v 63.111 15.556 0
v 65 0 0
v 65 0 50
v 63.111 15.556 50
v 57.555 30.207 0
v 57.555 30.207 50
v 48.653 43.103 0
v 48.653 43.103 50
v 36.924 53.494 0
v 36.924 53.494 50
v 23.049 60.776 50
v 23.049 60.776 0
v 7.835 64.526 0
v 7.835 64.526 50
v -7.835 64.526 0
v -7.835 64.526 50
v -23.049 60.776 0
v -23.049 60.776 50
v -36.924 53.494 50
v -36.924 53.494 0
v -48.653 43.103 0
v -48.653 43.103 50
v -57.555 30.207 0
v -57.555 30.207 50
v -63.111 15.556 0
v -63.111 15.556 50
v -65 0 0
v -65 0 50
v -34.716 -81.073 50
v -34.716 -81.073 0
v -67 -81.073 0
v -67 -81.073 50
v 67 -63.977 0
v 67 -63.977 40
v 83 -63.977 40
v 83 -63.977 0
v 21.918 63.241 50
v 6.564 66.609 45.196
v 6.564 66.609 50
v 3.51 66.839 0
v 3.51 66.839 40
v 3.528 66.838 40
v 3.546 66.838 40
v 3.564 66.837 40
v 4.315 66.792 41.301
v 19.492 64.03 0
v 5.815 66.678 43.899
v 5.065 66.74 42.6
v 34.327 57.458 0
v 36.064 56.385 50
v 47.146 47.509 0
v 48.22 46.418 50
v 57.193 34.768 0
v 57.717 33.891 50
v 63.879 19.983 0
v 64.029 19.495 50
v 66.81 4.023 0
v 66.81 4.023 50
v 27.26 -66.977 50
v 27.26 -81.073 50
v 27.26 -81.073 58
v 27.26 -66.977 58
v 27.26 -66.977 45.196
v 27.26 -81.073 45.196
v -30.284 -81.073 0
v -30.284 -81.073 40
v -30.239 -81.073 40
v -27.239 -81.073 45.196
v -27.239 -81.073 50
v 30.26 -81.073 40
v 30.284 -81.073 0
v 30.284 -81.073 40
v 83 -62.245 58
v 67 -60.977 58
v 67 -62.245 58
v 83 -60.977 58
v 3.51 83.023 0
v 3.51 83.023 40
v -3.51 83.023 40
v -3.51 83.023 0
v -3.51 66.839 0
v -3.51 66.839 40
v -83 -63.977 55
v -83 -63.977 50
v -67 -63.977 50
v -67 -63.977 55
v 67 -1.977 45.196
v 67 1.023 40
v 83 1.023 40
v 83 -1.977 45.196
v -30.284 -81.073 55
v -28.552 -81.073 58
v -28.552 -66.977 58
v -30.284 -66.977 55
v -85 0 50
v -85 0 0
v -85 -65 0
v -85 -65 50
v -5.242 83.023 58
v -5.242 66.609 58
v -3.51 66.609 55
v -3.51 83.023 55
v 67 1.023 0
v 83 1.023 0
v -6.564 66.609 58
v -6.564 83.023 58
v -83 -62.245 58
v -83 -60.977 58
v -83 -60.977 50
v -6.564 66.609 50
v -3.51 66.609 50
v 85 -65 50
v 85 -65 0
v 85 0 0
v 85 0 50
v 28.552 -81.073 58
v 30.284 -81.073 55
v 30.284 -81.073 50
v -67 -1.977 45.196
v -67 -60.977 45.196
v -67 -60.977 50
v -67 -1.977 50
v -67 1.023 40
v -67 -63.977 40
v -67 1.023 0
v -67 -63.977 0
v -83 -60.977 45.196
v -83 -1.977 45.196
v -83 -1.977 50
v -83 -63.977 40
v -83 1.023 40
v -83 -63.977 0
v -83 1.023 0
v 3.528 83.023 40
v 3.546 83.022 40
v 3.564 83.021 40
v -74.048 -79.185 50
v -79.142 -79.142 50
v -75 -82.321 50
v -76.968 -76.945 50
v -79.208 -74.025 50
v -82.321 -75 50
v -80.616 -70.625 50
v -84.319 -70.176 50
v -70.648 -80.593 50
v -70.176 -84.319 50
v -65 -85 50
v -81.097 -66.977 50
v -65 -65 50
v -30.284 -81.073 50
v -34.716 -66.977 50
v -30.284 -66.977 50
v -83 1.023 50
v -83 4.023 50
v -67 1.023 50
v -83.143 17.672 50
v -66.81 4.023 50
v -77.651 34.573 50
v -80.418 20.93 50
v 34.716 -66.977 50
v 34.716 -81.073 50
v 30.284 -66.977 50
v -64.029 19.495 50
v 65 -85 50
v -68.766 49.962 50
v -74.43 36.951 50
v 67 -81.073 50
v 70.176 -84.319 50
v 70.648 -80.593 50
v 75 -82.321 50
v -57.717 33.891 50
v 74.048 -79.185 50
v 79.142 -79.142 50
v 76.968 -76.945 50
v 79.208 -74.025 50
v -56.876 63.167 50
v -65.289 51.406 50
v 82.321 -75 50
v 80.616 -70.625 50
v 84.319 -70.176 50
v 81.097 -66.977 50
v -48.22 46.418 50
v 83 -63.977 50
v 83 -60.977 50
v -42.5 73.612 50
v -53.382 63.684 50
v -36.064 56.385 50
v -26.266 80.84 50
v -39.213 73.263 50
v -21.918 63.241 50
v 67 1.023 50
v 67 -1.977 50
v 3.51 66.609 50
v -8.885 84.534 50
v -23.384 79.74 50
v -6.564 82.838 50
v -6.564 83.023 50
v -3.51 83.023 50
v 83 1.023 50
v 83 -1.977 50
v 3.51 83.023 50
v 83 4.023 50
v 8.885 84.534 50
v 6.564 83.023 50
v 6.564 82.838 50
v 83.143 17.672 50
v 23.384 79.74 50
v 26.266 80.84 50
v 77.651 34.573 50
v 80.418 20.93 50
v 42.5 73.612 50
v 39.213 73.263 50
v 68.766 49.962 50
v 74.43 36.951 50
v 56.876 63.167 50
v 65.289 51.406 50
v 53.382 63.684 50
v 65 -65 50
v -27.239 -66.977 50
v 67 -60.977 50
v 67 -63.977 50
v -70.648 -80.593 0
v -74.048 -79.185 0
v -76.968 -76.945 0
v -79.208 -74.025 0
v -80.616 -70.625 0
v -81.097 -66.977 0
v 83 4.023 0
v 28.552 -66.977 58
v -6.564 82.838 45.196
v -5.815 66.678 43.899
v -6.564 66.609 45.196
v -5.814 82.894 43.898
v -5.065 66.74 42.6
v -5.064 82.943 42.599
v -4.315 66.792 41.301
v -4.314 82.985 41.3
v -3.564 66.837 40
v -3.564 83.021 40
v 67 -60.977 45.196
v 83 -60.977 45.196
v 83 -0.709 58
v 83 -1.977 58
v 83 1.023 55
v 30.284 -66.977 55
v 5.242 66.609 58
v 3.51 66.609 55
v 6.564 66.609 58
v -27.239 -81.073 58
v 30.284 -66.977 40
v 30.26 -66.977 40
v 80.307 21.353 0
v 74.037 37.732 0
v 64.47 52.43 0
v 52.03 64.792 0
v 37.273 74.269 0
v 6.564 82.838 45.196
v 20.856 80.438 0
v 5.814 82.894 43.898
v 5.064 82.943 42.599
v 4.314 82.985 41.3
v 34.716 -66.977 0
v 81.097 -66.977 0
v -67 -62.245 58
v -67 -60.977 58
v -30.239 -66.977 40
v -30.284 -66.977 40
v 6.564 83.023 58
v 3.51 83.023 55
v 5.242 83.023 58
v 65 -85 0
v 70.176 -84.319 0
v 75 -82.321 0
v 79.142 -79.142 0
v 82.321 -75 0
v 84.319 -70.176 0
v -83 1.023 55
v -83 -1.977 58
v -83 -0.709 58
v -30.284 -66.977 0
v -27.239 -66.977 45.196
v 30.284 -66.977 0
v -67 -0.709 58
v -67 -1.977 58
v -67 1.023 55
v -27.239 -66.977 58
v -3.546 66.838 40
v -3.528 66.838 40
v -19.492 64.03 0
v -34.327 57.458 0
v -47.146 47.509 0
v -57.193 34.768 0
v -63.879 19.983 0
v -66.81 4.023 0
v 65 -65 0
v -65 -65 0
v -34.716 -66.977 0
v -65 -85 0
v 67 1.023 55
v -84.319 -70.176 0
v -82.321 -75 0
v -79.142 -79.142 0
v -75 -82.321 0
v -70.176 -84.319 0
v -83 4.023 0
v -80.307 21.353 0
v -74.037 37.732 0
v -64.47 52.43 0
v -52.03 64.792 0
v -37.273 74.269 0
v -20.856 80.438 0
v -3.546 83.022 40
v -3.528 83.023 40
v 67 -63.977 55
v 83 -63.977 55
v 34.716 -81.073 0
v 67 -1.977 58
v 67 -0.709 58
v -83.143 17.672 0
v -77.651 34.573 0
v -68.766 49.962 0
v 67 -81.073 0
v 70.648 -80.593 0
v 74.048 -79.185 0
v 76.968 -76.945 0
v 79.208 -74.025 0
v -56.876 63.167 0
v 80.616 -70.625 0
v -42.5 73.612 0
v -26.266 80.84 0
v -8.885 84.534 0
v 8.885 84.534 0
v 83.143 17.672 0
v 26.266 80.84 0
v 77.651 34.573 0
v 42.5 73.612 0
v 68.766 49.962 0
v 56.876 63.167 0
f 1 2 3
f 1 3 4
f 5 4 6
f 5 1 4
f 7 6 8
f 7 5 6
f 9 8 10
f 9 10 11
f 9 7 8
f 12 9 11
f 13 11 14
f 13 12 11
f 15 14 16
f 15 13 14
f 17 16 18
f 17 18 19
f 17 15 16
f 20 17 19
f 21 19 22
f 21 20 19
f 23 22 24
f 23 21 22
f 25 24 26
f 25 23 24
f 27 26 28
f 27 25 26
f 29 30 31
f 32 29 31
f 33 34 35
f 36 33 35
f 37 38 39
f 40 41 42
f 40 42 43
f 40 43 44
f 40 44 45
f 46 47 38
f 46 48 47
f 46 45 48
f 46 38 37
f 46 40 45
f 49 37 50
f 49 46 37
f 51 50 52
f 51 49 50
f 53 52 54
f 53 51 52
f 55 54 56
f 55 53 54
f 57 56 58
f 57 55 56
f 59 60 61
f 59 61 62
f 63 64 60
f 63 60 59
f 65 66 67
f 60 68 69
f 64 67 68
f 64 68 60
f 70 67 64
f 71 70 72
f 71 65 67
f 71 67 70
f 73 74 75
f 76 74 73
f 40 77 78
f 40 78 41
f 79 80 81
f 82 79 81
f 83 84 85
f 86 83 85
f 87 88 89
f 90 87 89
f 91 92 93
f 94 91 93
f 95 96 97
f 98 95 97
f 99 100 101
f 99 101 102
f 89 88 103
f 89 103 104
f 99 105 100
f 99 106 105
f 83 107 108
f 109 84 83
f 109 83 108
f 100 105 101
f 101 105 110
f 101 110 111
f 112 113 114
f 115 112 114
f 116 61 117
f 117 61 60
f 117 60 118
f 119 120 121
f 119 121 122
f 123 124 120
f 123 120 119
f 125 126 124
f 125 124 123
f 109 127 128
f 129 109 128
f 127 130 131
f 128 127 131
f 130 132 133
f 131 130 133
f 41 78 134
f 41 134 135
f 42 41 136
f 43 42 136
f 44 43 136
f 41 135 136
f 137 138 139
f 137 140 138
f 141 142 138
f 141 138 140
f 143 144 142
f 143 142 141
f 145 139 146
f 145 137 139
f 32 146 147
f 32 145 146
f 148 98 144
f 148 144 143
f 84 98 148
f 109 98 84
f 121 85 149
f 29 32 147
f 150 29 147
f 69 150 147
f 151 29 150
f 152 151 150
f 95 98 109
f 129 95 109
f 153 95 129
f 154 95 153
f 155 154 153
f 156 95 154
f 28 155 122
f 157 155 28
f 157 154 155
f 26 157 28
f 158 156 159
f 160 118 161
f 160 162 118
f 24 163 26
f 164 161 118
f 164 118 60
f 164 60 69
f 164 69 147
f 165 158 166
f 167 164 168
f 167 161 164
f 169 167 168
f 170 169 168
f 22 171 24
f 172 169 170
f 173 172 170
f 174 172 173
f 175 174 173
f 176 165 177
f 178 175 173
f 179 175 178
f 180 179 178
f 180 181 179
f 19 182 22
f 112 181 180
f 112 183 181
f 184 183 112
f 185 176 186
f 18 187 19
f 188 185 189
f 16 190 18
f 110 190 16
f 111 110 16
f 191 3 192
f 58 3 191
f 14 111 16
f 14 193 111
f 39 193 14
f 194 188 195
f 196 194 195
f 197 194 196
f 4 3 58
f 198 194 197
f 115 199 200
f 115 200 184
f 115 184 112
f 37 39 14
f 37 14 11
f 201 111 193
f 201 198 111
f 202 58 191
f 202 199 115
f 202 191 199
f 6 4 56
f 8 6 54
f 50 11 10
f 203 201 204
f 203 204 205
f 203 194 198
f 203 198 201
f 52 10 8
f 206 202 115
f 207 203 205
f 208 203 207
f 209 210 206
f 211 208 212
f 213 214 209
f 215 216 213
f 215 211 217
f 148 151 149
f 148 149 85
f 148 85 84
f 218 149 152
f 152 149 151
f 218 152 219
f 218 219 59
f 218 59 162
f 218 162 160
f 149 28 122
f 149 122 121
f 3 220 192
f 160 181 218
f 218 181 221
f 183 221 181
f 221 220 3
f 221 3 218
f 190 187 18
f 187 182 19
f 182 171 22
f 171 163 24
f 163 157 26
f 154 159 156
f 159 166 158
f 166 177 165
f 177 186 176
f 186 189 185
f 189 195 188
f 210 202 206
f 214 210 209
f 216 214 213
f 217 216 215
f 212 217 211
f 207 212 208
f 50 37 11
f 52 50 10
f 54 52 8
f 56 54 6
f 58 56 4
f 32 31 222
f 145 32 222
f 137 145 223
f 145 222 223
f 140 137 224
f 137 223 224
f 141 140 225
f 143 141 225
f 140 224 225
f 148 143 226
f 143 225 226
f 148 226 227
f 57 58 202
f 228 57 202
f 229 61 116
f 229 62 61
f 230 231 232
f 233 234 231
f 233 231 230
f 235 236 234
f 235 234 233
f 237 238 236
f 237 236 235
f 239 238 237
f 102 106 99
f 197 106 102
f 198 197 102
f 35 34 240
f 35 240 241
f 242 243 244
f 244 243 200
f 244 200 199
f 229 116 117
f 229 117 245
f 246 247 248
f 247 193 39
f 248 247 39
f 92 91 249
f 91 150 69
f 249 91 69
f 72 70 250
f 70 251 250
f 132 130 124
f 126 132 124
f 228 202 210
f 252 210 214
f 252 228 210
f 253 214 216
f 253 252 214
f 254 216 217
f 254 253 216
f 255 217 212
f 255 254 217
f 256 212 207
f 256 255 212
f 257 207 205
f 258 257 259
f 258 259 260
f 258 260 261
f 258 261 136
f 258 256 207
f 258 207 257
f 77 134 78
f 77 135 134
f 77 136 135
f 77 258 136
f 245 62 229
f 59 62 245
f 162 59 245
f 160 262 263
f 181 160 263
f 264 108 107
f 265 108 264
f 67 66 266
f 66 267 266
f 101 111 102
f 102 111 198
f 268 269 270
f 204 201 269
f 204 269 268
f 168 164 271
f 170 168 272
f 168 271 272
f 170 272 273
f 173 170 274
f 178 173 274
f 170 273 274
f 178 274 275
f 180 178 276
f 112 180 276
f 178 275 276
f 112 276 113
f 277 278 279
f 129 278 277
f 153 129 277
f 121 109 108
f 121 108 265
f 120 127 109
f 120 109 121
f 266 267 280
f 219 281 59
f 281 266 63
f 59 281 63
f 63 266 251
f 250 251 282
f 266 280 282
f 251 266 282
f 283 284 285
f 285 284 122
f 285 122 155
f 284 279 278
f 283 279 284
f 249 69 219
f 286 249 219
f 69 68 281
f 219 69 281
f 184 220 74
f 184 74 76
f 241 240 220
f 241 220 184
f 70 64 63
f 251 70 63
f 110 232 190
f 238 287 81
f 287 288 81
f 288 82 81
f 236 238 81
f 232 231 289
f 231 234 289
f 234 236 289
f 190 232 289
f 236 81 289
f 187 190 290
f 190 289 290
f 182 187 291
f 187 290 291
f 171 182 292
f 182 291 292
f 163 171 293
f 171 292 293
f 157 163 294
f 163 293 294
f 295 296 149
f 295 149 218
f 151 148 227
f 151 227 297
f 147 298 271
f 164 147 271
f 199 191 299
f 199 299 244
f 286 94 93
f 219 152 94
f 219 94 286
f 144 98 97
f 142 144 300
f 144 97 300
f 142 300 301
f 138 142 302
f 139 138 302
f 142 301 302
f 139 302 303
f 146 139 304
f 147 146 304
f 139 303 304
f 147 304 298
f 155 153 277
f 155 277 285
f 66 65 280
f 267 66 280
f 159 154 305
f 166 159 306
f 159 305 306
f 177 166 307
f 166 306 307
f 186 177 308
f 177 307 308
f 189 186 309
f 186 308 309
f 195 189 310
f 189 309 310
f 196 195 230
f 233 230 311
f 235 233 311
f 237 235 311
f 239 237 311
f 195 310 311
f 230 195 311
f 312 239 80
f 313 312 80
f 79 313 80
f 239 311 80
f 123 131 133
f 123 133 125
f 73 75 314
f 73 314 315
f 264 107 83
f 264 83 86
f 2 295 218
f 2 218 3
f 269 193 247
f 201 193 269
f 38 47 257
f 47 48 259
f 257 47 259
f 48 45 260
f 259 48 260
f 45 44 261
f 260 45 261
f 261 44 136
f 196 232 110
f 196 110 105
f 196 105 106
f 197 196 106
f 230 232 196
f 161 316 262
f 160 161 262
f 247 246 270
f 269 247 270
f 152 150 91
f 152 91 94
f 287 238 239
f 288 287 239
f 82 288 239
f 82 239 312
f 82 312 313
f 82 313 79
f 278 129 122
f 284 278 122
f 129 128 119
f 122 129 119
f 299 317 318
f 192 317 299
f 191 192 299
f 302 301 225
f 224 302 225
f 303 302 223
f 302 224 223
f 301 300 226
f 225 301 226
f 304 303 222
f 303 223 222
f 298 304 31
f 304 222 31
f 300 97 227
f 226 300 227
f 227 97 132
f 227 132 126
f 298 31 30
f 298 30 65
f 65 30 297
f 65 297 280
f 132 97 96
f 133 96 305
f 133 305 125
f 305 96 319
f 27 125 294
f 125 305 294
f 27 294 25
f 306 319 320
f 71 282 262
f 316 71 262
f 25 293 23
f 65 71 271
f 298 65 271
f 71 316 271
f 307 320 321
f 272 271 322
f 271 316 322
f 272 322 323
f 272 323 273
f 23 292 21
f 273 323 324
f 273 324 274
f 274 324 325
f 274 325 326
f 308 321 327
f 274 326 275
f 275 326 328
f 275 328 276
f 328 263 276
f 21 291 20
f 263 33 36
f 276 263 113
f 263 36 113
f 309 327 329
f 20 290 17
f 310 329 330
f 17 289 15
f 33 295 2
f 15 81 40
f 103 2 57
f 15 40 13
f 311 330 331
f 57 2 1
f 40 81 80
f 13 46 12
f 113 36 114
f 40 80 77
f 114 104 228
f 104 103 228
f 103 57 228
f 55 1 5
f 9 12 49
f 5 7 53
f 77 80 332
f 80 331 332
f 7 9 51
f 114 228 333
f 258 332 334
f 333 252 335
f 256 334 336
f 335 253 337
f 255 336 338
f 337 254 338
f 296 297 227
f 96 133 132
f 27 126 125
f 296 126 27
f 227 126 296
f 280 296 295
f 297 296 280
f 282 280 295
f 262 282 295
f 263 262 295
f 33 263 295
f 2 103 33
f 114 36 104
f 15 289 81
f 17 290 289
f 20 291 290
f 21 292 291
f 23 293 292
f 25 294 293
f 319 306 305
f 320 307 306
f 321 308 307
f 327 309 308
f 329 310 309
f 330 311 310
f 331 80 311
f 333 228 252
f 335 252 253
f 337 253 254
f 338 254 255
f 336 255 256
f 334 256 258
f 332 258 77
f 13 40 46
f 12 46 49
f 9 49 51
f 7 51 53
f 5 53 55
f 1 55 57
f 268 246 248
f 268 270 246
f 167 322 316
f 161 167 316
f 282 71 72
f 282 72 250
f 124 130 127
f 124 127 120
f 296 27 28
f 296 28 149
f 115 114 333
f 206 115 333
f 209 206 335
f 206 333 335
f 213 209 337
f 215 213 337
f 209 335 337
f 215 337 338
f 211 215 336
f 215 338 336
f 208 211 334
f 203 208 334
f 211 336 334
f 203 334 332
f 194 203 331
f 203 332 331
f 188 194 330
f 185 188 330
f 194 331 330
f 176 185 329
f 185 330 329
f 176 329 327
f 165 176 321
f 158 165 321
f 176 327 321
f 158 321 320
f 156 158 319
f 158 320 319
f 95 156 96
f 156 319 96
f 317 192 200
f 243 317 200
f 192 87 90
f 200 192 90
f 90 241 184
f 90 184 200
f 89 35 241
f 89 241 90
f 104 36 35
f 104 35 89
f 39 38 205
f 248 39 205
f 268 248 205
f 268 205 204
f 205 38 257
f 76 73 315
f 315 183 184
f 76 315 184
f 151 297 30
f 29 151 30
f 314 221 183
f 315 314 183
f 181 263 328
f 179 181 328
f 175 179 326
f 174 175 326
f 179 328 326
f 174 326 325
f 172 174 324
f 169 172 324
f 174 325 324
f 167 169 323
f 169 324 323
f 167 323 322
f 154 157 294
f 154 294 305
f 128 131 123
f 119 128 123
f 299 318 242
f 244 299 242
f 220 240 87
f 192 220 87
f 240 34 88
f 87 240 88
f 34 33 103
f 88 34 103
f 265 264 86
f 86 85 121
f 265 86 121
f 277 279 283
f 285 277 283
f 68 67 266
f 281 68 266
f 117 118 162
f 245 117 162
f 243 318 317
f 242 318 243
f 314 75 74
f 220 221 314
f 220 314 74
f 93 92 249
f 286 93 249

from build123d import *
from OCP.BRepFilletAPI import BRepFilletAPI_MakeChamfer

# Parameters (mm, degrees)
CROQUIS1_W              = 16
CROQUIS1_H              = 65
CROQUIS1_W_2            = 60.56813556
CROQUIS1_H_2            = 14.096609531
SALIENTE_EXTRUIR1_DEPTH = 50
CROQUIS3_W              = 16
CROQUIS3_H              = 3
CROQUIS3_W_2            = 3.053388568
CROQUIS3_H_2            = 16.41437111
CROQUIS3_W_3            = 3.044949639
CROQUIS3_H_3            = 14.096609531
CROQUIS3_W_4            = 3.024386733
SALIENTE_EXTRUIR2_DEPTH = 18
CHAFL_N2_SIZE           = 3
CHAFL_N2_SIZE2          = 1.732050808
CHAFL_N3_SIZE           = 5.196152423
CHAFL_N3_SIZE_2         = 3


with BuildPart() as part:
    # Croquis1 → Saliente-Extruir1 (new body)
    with BuildSketch(Plane.XY):
        with BuildLine():
            Line((-85, 0), (-85, -65))
            ThreePointArc((-85, -65), (-79.142135624, -79.142135624), (-65, -85))
            Line((-65, -85), (65, -85))
            ThreePointArc((65, -85), (79.142135624, -79.142135624), (85, -65))
            Line((85, -65), (85, 0))
            ThreePointArc((85, 0), (0, 85), (-85, 0))
        make_face()
        with Locations((75, -31.476837664)):
            Rectangle(CROQUIS1_W, CROQUIS1_H, mode=Mode.SUBTRACT)
        with BuildLine():
            Line((-65, -65), (65, -65))
            Line((65, -65), (65, 0))
            ThreePointArc((65, 0), (0, 65), (-65, 0))
            Line((-65, 0), (-65, -65))
        make_face(mode=Mode.SUBTRACT)
        with Locations((-75, -31.476837664)):
            Rectangle(CROQUIS1_W, CROQUIS1_H, mode=Mode.SUBTRACT)
        with BuildLine():
            Line((3.510152615, 83.023277843), (3.510152615, 66.83939974))
            ThreePointArc((3.510152615, 66.83939974), (47.145709065, 47.509037517), (66.810483413, 4.023162336))
            Line((66.810483413, 4.023162336), (83, 4.023162336))
            ThreePointArc((83, 4.023162336), (58.576925397, 58.940051292), (3.510152615, 83.023277843))
        make_face(mode=Mode.SUBTRACT)
        with BuildLine():
            Line((-66.810483413, 4.023162336), (-83, 4.023162336))
            ThreePointArc((-83, 4.023162336), (-58.576925397, 58.940051292), (-3.510152615, 83.023277843))
            Line((-3.510152615, 83.023277843), (-3.510152615, 66.83939974))
            ThreePointArc((-3.510152615, 66.83939974), (-47.145709065, 47.509037517), (-66.810483413, 4.023162336))
        make_face(mode=Mode.SUBTRACT)
        with BuildLine():
            Line((-81.096609531, -66.976837664), (-34.71593222, -66.976837664))
            Line((-34.71593222, -66.976837664), (-34.71593222, -81.073447195))
            Line((-34.71593222, -81.073447195), (-67, -81.073447195))
            ThreePointArc((-67, -81.073447195), (-76.967808191, -76.944645855), (-81.096609531, -66.976837664))
        make_face(mode=Mode.SUBTRACT)
        with BuildLine():
            Line((67, -81.073447195), (34.71593222, -81.073447195))
            Line((34.71593222, -81.073447195), (34.71593222, -66.976837664))
            Line((34.71593222, -66.976837664), (81.096609531, -66.976837664))
            ThreePointArc((81.096609531, -66.976837664), (76.967808191, -76.944645855), (67, -81.073447195))
        make_face(mode=Mode.SUBTRACT)
        with Locations((0, -74.025142429)):
            Rectangle(CROQUIS1_W_2, CROQUIS1_H_2, mode=Mode.SUBTRACT)
    extrude(amount=SALIENTE_EXTRUIR1_DEPTH)

    # Croquis3 → Saliente-Extruir2 (add)
    with BuildSketch(Plane.XY.offset(40)):
        with Locations((-75, -0.476837664)):
            Rectangle(CROQUIS3_W, CROQUIS3_H)
        with Locations((-75, -62.476837664)):
            Rectangle(CROQUIS3_W, CROQUIS3_H)
        with Locations((75, -62.476837664)):
            Rectangle(CROQUIS3_W, CROQUIS3_H)
        with Locations((75, -0.476837664)):
            Rectangle(CROQUIS3_W, CROQUIS3_H)
        with Locations((-5.036846899, 74.816092288)):
            Rectangle(CROQUIS3_W_2, CROQUIS3_H_2)
        with Locations((5.036846899, 74.816092288)):
            Rectangle(CROQUIS3_W_2, CROQUIS3_H_2)
        with Locations((-28.761592961, -74.025142429)):
            Rectangle(CROQUIS3_W_3, CROQUIS3_H_3)
        with Locations((28.771874414, -74.025142429)):
            Rectangle(CROQUIS3_W_4, CROQUIS3_H_3)
    extrude(amount=SALIENTE_EXTRUIR2_DEPTH)

    # Chaflán2: one chamfer whose edges measure the first distance from different faces: ONE call of the kernel's chamfer builder (chamfer() names one face for all edges)
    chafl_n2_edges_1 = [part.edges().sort_by_distance(p)[0] for p in [
        (-75, 1.023162336, 58),
    ]]
    chafl_n2_side_1 = [part.faces().sort_by_distance(p)[0] for p in [
        (-75, 1.023162336, 54),
    ]]
    chafl_n2_edges_2 = [part.edges().sort_by_distance(p)[0] for p in [
        (-75, -63.976837664, 58),
    ]]
    chafl_n2_side_2 = [part.faces().sort_by_distance(p)[0] for p in [
        (-75, -63.976837664, 54),
    ]]
    chafl_n2_edges_3 = [part.edges().sort_by_distance(p)[0] for p in [
        (75, -63.976837664, 58),
    ]]
    chafl_n2_side_3 = [part.faces().sort_by_distance(p)[0] for p in [
        (75, -63.976837664, 54),
    ]]
    chafl_n2_edges_4 = [part.edges().sort_by_distance(p)[0] for p in [
        (75, 1.023162336, 58),
    ]]
    chafl_n2_side_4 = [part.faces().sort_by_distance(p)[0] for p in [
        (75, 1.023162336, 54),
    ]]
    chafl_n2_edges_5 = [part.edges().sort_by_distance(p)[0] for p in [
        (-3.510152615, 74.816092288, 58),
    ]]
    chafl_n2_side_5 = [part.faces().sort_by_distance(p)[0] for p in [
        (-3.510152615, 74.816092288, 54),
    ]]
    chafl_n2_edges_6 = [part.edges().sort_by_distance(p)[0] for p in [
        (3.510152615, 74.816092288, 58),
    ]]
    chafl_n2_side_6 = [part.faces().sort_by_distance(p)[0] for p in [
        (3.510152615, 74.816092288, 54),
    ]]
    chafl_n2_edges_7 = [part.edges().sort_by_distance(p)[0] for p in [
        (-30.28406778, -74.025142429, 58),
    ]]
    chafl_n2_side_7 = [part.faces().sort_by_distance(p)[0] for p in [
        (-30.28406778, -74.025142429, 54),
    ]]
    chafl_n2_edges_8 = [part.edges().sort_by_distance(p)[0] for p in [
        (30.28406778, -74.025142429, 58),
    ]]
    chafl_n2_side_8 = [part.faces().sort_by_distance(p)[0] for p in [
        (30.28406778, -74.025142429, 54),
    ]]
    chafl_n2 = BRepFilletAPI_MakeChamfer(part.part.solid().wrapped)
    for e in chafl_n2_edges_1:
        chafl_n2.Add(CHAFL_N2_SIZE, CHAFL_N2_SIZE2, e.wrapped, chafl_n2_side_1[0].wrapped)  # the first distance lies on this face
    for e in chafl_n2_edges_2:
        chafl_n2.Add(CHAFL_N2_SIZE, CHAFL_N2_SIZE2, e.wrapped, chafl_n2_side_2[0].wrapped)  # the first distance lies on this face
    for e in chafl_n2_edges_3:
        chafl_n2.Add(CHAFL_N2_SIZE, CHAFL_N2_SIZE2, e.wrapped, chafl_n2_side_3[0].wrapped)  # the first distance lies on this face
    for e in chafl_n2_edges_4:
        chafl_n2.Add(CHAFL_N2_SIZE, CHAFL_N2_SIZE2, e.wrapped, chafl_n2_side_4[0].wrapped)  # the first distance lies on this face
    for e in chafl_n2_edges_5:
        chafl_n2.Add(CHAFL_N2_SIZE, CHAFL_N2_SIZE2, e.wrapped, chafl_n2_side_5[0].wrapped)  # the first distance lies on this face
    for e in chafl_n2_edges_6:
        chafl_n2.Add(CHAFL_N2_SIZE, CHAFL_N2_SIZE2, e.wrapped, chafl_n2_side_6[0].wrapped)  # the first distance lies on this face
    for e in chafl_n2_edges_7:
        chafl_n2.Add(CHAFL_N2_SIZE, CHAFL_N2_SIZE2, e.wrapped, chafl_n2_side_7[0].wrapped)  # the first distance lies on this face
    for e in chafl_n2_edges_8:
        chafl_n2.Add(CHAFL_N2_SIZE, CHAFL_N2_SIZE2, e.wrapped, chafl_n2_side_8[0].wrapped)  # the first distance lies on this face
    add(Compound.cast(chafl_n2.Shape()), mode=Mode.REPLACE)

    # Chaflán3
    chafl_n3_edges_1 = [part.edges().sort_by_distance(p)[0] for p in [
        (75, -60.976837664, 40),
    ]]
    chafl_n3_side_1 = [part.faces().sort_by_distance(p)[0] for p in [
        (75, -60.976837664, 40.06),
    ]]
    chafl_n3_edges_2 = [part.edges().sort_by_distance(p)[0] for p in [
        (75, -1.976837664, 40),
    ]]
    chafl_n3_side_2 = [part.faces().sort_by_distance(p)[0] for p in [
        (75, -1.976837664, 40.06),
    ]]
    chafl_n3_edges_3 = [part.edges().sort_by_distance(p)[0] for p in [
        (27.259681047, -74.025142429, 40),
    ]]
    chafl_n3_side_3 = [part.faces().sort_by_distance(p)[0] for p in [
        (27.319681047, -74.025142429, 40),
    ]]
    chafl_n3_edges_4 = [part.edges().sort_by_distance(p)[0] for p in [
        (-27.239118141, -74.025142429, 40),
    ]]
    chafl_n3_side_4 = [part.faces().sort_by_distance(p)[0] for p in [
        (-27.239118141, -74.025142429, 40.06),
    ]]
    chafl_n3_edges_5 = [part.edges().sort_by_distance(p)[0] for p in [
        (-75, -60.976837664, 40),
    ]]
    chafl_n3_side_5 = [part.faces().sort_by_distance(p)[0] for p in [
        (-75, -60.976837664, 40.06),
    ]]
    chafl_n3_edges_6 = [part.edges().sort_by_distance(p)[0] for p in [
        (-75, -1.976837664, 40),
    ]]
    chafl_n3_side_6 = [part.faces().sort_by_distance(p)[0] for p in [
        (-75, -1.976837664, 40.06),
    ]]
    chafl_n3_edges_7 = [part.edges().sort_by_distance(p)[0] for p in [
        (-6.563541183, 74.72336741, 40),
    ]]
    chafl_n3_side_7 = [part.faces().sort_by_distance(p)[0] for p in [
        (-6.563541183, 74.72336741, 40.06),
    ]]
    chafl_n3_edges_8 = [part.edges().sort_by_distance(p)[0] for p in [
        (6.563541183, 74.72336741, 40),
    ]]
    chafl_n3_side_8 = [part.faces().sort_by_distance(p)[0] for p in [
        (6.563541183, 74.72336741, 40.06),
    ]]
    chafl_n3 = BRepFilletAPI_MakeChamfer(part.part.solid().wrapped)
    for e in chafl_n3_edges_1:
        chafl_n3.Add(CHAFL_N3_SIZE - 0.0001, CHAFL_N3_SIZE_2 - 0.0001, e.wrapped, chafl_n3_side_1[0].wrapped)
    for e in chafl_n3_edges_2:
        chafl_n3.Add(CHAFL_N3_SIZE - 0.0001, CHAFL_N3_SIZE_2 - 0.0001, e.wrapped, chafl_n3_side_2[0].wrapped)
    for e in chafl_n3_edges_3:
        chafl_n3.Add(CHAFL_N3_SIZE_2 - 0.0001, CHAFL_N3_SIZE - 0.0001, e.wrapped, chafl_n3_side_3[0].wrapped)
    for e in chafl_n3_edges_4:
        chafl_n3.Add(CHAFL_N3_SIZE - 0.0001, CHAFL_N3_SIZE_2 - 0.0001, e.wrapped, chafl_n3_side_4[0].wrapped)
    for e in chafl_n3_edges_5:
        chafl_n3.Add(CHAFL_N3_SIZE - 0.0001, CHAFL_N3_SIZE_2 - 0.0001, e.wrapped, chafl_n3_side_5[0].wrapped)
    for e in chafl_n3_edges_6:
        chafl_n3.Add(CHAFL_N3_SIZE - 0.0001, CHAFL_N3_SIZE_2 - 0.0001, e.wrapped, chafl_n3_side_6[0].wrapped)
    for e in chafl_n3_edges_7:
        chafl_n3.Add(CHAFL_N3_SIZE - 0.0001, CHAFL_N3_SIZE_2 - 0.0001, e.wrapped, chafl_n3_side_7[0].wrapped)
    for e in chafl_n3_edges_8:
        chafl_n3.Add(CHAFL_N3_SIZE - 0.0001, CHAFL_N3_SIZE_2 - 0.0001, e.wrapped, chafl_n3_side_8[0].wrapped)
    add(Compound.cast(chafl_n3.Shape()), mode=Mode.REPLACE)  # a hair under: the kernel refuses the full size


solid = part.part
